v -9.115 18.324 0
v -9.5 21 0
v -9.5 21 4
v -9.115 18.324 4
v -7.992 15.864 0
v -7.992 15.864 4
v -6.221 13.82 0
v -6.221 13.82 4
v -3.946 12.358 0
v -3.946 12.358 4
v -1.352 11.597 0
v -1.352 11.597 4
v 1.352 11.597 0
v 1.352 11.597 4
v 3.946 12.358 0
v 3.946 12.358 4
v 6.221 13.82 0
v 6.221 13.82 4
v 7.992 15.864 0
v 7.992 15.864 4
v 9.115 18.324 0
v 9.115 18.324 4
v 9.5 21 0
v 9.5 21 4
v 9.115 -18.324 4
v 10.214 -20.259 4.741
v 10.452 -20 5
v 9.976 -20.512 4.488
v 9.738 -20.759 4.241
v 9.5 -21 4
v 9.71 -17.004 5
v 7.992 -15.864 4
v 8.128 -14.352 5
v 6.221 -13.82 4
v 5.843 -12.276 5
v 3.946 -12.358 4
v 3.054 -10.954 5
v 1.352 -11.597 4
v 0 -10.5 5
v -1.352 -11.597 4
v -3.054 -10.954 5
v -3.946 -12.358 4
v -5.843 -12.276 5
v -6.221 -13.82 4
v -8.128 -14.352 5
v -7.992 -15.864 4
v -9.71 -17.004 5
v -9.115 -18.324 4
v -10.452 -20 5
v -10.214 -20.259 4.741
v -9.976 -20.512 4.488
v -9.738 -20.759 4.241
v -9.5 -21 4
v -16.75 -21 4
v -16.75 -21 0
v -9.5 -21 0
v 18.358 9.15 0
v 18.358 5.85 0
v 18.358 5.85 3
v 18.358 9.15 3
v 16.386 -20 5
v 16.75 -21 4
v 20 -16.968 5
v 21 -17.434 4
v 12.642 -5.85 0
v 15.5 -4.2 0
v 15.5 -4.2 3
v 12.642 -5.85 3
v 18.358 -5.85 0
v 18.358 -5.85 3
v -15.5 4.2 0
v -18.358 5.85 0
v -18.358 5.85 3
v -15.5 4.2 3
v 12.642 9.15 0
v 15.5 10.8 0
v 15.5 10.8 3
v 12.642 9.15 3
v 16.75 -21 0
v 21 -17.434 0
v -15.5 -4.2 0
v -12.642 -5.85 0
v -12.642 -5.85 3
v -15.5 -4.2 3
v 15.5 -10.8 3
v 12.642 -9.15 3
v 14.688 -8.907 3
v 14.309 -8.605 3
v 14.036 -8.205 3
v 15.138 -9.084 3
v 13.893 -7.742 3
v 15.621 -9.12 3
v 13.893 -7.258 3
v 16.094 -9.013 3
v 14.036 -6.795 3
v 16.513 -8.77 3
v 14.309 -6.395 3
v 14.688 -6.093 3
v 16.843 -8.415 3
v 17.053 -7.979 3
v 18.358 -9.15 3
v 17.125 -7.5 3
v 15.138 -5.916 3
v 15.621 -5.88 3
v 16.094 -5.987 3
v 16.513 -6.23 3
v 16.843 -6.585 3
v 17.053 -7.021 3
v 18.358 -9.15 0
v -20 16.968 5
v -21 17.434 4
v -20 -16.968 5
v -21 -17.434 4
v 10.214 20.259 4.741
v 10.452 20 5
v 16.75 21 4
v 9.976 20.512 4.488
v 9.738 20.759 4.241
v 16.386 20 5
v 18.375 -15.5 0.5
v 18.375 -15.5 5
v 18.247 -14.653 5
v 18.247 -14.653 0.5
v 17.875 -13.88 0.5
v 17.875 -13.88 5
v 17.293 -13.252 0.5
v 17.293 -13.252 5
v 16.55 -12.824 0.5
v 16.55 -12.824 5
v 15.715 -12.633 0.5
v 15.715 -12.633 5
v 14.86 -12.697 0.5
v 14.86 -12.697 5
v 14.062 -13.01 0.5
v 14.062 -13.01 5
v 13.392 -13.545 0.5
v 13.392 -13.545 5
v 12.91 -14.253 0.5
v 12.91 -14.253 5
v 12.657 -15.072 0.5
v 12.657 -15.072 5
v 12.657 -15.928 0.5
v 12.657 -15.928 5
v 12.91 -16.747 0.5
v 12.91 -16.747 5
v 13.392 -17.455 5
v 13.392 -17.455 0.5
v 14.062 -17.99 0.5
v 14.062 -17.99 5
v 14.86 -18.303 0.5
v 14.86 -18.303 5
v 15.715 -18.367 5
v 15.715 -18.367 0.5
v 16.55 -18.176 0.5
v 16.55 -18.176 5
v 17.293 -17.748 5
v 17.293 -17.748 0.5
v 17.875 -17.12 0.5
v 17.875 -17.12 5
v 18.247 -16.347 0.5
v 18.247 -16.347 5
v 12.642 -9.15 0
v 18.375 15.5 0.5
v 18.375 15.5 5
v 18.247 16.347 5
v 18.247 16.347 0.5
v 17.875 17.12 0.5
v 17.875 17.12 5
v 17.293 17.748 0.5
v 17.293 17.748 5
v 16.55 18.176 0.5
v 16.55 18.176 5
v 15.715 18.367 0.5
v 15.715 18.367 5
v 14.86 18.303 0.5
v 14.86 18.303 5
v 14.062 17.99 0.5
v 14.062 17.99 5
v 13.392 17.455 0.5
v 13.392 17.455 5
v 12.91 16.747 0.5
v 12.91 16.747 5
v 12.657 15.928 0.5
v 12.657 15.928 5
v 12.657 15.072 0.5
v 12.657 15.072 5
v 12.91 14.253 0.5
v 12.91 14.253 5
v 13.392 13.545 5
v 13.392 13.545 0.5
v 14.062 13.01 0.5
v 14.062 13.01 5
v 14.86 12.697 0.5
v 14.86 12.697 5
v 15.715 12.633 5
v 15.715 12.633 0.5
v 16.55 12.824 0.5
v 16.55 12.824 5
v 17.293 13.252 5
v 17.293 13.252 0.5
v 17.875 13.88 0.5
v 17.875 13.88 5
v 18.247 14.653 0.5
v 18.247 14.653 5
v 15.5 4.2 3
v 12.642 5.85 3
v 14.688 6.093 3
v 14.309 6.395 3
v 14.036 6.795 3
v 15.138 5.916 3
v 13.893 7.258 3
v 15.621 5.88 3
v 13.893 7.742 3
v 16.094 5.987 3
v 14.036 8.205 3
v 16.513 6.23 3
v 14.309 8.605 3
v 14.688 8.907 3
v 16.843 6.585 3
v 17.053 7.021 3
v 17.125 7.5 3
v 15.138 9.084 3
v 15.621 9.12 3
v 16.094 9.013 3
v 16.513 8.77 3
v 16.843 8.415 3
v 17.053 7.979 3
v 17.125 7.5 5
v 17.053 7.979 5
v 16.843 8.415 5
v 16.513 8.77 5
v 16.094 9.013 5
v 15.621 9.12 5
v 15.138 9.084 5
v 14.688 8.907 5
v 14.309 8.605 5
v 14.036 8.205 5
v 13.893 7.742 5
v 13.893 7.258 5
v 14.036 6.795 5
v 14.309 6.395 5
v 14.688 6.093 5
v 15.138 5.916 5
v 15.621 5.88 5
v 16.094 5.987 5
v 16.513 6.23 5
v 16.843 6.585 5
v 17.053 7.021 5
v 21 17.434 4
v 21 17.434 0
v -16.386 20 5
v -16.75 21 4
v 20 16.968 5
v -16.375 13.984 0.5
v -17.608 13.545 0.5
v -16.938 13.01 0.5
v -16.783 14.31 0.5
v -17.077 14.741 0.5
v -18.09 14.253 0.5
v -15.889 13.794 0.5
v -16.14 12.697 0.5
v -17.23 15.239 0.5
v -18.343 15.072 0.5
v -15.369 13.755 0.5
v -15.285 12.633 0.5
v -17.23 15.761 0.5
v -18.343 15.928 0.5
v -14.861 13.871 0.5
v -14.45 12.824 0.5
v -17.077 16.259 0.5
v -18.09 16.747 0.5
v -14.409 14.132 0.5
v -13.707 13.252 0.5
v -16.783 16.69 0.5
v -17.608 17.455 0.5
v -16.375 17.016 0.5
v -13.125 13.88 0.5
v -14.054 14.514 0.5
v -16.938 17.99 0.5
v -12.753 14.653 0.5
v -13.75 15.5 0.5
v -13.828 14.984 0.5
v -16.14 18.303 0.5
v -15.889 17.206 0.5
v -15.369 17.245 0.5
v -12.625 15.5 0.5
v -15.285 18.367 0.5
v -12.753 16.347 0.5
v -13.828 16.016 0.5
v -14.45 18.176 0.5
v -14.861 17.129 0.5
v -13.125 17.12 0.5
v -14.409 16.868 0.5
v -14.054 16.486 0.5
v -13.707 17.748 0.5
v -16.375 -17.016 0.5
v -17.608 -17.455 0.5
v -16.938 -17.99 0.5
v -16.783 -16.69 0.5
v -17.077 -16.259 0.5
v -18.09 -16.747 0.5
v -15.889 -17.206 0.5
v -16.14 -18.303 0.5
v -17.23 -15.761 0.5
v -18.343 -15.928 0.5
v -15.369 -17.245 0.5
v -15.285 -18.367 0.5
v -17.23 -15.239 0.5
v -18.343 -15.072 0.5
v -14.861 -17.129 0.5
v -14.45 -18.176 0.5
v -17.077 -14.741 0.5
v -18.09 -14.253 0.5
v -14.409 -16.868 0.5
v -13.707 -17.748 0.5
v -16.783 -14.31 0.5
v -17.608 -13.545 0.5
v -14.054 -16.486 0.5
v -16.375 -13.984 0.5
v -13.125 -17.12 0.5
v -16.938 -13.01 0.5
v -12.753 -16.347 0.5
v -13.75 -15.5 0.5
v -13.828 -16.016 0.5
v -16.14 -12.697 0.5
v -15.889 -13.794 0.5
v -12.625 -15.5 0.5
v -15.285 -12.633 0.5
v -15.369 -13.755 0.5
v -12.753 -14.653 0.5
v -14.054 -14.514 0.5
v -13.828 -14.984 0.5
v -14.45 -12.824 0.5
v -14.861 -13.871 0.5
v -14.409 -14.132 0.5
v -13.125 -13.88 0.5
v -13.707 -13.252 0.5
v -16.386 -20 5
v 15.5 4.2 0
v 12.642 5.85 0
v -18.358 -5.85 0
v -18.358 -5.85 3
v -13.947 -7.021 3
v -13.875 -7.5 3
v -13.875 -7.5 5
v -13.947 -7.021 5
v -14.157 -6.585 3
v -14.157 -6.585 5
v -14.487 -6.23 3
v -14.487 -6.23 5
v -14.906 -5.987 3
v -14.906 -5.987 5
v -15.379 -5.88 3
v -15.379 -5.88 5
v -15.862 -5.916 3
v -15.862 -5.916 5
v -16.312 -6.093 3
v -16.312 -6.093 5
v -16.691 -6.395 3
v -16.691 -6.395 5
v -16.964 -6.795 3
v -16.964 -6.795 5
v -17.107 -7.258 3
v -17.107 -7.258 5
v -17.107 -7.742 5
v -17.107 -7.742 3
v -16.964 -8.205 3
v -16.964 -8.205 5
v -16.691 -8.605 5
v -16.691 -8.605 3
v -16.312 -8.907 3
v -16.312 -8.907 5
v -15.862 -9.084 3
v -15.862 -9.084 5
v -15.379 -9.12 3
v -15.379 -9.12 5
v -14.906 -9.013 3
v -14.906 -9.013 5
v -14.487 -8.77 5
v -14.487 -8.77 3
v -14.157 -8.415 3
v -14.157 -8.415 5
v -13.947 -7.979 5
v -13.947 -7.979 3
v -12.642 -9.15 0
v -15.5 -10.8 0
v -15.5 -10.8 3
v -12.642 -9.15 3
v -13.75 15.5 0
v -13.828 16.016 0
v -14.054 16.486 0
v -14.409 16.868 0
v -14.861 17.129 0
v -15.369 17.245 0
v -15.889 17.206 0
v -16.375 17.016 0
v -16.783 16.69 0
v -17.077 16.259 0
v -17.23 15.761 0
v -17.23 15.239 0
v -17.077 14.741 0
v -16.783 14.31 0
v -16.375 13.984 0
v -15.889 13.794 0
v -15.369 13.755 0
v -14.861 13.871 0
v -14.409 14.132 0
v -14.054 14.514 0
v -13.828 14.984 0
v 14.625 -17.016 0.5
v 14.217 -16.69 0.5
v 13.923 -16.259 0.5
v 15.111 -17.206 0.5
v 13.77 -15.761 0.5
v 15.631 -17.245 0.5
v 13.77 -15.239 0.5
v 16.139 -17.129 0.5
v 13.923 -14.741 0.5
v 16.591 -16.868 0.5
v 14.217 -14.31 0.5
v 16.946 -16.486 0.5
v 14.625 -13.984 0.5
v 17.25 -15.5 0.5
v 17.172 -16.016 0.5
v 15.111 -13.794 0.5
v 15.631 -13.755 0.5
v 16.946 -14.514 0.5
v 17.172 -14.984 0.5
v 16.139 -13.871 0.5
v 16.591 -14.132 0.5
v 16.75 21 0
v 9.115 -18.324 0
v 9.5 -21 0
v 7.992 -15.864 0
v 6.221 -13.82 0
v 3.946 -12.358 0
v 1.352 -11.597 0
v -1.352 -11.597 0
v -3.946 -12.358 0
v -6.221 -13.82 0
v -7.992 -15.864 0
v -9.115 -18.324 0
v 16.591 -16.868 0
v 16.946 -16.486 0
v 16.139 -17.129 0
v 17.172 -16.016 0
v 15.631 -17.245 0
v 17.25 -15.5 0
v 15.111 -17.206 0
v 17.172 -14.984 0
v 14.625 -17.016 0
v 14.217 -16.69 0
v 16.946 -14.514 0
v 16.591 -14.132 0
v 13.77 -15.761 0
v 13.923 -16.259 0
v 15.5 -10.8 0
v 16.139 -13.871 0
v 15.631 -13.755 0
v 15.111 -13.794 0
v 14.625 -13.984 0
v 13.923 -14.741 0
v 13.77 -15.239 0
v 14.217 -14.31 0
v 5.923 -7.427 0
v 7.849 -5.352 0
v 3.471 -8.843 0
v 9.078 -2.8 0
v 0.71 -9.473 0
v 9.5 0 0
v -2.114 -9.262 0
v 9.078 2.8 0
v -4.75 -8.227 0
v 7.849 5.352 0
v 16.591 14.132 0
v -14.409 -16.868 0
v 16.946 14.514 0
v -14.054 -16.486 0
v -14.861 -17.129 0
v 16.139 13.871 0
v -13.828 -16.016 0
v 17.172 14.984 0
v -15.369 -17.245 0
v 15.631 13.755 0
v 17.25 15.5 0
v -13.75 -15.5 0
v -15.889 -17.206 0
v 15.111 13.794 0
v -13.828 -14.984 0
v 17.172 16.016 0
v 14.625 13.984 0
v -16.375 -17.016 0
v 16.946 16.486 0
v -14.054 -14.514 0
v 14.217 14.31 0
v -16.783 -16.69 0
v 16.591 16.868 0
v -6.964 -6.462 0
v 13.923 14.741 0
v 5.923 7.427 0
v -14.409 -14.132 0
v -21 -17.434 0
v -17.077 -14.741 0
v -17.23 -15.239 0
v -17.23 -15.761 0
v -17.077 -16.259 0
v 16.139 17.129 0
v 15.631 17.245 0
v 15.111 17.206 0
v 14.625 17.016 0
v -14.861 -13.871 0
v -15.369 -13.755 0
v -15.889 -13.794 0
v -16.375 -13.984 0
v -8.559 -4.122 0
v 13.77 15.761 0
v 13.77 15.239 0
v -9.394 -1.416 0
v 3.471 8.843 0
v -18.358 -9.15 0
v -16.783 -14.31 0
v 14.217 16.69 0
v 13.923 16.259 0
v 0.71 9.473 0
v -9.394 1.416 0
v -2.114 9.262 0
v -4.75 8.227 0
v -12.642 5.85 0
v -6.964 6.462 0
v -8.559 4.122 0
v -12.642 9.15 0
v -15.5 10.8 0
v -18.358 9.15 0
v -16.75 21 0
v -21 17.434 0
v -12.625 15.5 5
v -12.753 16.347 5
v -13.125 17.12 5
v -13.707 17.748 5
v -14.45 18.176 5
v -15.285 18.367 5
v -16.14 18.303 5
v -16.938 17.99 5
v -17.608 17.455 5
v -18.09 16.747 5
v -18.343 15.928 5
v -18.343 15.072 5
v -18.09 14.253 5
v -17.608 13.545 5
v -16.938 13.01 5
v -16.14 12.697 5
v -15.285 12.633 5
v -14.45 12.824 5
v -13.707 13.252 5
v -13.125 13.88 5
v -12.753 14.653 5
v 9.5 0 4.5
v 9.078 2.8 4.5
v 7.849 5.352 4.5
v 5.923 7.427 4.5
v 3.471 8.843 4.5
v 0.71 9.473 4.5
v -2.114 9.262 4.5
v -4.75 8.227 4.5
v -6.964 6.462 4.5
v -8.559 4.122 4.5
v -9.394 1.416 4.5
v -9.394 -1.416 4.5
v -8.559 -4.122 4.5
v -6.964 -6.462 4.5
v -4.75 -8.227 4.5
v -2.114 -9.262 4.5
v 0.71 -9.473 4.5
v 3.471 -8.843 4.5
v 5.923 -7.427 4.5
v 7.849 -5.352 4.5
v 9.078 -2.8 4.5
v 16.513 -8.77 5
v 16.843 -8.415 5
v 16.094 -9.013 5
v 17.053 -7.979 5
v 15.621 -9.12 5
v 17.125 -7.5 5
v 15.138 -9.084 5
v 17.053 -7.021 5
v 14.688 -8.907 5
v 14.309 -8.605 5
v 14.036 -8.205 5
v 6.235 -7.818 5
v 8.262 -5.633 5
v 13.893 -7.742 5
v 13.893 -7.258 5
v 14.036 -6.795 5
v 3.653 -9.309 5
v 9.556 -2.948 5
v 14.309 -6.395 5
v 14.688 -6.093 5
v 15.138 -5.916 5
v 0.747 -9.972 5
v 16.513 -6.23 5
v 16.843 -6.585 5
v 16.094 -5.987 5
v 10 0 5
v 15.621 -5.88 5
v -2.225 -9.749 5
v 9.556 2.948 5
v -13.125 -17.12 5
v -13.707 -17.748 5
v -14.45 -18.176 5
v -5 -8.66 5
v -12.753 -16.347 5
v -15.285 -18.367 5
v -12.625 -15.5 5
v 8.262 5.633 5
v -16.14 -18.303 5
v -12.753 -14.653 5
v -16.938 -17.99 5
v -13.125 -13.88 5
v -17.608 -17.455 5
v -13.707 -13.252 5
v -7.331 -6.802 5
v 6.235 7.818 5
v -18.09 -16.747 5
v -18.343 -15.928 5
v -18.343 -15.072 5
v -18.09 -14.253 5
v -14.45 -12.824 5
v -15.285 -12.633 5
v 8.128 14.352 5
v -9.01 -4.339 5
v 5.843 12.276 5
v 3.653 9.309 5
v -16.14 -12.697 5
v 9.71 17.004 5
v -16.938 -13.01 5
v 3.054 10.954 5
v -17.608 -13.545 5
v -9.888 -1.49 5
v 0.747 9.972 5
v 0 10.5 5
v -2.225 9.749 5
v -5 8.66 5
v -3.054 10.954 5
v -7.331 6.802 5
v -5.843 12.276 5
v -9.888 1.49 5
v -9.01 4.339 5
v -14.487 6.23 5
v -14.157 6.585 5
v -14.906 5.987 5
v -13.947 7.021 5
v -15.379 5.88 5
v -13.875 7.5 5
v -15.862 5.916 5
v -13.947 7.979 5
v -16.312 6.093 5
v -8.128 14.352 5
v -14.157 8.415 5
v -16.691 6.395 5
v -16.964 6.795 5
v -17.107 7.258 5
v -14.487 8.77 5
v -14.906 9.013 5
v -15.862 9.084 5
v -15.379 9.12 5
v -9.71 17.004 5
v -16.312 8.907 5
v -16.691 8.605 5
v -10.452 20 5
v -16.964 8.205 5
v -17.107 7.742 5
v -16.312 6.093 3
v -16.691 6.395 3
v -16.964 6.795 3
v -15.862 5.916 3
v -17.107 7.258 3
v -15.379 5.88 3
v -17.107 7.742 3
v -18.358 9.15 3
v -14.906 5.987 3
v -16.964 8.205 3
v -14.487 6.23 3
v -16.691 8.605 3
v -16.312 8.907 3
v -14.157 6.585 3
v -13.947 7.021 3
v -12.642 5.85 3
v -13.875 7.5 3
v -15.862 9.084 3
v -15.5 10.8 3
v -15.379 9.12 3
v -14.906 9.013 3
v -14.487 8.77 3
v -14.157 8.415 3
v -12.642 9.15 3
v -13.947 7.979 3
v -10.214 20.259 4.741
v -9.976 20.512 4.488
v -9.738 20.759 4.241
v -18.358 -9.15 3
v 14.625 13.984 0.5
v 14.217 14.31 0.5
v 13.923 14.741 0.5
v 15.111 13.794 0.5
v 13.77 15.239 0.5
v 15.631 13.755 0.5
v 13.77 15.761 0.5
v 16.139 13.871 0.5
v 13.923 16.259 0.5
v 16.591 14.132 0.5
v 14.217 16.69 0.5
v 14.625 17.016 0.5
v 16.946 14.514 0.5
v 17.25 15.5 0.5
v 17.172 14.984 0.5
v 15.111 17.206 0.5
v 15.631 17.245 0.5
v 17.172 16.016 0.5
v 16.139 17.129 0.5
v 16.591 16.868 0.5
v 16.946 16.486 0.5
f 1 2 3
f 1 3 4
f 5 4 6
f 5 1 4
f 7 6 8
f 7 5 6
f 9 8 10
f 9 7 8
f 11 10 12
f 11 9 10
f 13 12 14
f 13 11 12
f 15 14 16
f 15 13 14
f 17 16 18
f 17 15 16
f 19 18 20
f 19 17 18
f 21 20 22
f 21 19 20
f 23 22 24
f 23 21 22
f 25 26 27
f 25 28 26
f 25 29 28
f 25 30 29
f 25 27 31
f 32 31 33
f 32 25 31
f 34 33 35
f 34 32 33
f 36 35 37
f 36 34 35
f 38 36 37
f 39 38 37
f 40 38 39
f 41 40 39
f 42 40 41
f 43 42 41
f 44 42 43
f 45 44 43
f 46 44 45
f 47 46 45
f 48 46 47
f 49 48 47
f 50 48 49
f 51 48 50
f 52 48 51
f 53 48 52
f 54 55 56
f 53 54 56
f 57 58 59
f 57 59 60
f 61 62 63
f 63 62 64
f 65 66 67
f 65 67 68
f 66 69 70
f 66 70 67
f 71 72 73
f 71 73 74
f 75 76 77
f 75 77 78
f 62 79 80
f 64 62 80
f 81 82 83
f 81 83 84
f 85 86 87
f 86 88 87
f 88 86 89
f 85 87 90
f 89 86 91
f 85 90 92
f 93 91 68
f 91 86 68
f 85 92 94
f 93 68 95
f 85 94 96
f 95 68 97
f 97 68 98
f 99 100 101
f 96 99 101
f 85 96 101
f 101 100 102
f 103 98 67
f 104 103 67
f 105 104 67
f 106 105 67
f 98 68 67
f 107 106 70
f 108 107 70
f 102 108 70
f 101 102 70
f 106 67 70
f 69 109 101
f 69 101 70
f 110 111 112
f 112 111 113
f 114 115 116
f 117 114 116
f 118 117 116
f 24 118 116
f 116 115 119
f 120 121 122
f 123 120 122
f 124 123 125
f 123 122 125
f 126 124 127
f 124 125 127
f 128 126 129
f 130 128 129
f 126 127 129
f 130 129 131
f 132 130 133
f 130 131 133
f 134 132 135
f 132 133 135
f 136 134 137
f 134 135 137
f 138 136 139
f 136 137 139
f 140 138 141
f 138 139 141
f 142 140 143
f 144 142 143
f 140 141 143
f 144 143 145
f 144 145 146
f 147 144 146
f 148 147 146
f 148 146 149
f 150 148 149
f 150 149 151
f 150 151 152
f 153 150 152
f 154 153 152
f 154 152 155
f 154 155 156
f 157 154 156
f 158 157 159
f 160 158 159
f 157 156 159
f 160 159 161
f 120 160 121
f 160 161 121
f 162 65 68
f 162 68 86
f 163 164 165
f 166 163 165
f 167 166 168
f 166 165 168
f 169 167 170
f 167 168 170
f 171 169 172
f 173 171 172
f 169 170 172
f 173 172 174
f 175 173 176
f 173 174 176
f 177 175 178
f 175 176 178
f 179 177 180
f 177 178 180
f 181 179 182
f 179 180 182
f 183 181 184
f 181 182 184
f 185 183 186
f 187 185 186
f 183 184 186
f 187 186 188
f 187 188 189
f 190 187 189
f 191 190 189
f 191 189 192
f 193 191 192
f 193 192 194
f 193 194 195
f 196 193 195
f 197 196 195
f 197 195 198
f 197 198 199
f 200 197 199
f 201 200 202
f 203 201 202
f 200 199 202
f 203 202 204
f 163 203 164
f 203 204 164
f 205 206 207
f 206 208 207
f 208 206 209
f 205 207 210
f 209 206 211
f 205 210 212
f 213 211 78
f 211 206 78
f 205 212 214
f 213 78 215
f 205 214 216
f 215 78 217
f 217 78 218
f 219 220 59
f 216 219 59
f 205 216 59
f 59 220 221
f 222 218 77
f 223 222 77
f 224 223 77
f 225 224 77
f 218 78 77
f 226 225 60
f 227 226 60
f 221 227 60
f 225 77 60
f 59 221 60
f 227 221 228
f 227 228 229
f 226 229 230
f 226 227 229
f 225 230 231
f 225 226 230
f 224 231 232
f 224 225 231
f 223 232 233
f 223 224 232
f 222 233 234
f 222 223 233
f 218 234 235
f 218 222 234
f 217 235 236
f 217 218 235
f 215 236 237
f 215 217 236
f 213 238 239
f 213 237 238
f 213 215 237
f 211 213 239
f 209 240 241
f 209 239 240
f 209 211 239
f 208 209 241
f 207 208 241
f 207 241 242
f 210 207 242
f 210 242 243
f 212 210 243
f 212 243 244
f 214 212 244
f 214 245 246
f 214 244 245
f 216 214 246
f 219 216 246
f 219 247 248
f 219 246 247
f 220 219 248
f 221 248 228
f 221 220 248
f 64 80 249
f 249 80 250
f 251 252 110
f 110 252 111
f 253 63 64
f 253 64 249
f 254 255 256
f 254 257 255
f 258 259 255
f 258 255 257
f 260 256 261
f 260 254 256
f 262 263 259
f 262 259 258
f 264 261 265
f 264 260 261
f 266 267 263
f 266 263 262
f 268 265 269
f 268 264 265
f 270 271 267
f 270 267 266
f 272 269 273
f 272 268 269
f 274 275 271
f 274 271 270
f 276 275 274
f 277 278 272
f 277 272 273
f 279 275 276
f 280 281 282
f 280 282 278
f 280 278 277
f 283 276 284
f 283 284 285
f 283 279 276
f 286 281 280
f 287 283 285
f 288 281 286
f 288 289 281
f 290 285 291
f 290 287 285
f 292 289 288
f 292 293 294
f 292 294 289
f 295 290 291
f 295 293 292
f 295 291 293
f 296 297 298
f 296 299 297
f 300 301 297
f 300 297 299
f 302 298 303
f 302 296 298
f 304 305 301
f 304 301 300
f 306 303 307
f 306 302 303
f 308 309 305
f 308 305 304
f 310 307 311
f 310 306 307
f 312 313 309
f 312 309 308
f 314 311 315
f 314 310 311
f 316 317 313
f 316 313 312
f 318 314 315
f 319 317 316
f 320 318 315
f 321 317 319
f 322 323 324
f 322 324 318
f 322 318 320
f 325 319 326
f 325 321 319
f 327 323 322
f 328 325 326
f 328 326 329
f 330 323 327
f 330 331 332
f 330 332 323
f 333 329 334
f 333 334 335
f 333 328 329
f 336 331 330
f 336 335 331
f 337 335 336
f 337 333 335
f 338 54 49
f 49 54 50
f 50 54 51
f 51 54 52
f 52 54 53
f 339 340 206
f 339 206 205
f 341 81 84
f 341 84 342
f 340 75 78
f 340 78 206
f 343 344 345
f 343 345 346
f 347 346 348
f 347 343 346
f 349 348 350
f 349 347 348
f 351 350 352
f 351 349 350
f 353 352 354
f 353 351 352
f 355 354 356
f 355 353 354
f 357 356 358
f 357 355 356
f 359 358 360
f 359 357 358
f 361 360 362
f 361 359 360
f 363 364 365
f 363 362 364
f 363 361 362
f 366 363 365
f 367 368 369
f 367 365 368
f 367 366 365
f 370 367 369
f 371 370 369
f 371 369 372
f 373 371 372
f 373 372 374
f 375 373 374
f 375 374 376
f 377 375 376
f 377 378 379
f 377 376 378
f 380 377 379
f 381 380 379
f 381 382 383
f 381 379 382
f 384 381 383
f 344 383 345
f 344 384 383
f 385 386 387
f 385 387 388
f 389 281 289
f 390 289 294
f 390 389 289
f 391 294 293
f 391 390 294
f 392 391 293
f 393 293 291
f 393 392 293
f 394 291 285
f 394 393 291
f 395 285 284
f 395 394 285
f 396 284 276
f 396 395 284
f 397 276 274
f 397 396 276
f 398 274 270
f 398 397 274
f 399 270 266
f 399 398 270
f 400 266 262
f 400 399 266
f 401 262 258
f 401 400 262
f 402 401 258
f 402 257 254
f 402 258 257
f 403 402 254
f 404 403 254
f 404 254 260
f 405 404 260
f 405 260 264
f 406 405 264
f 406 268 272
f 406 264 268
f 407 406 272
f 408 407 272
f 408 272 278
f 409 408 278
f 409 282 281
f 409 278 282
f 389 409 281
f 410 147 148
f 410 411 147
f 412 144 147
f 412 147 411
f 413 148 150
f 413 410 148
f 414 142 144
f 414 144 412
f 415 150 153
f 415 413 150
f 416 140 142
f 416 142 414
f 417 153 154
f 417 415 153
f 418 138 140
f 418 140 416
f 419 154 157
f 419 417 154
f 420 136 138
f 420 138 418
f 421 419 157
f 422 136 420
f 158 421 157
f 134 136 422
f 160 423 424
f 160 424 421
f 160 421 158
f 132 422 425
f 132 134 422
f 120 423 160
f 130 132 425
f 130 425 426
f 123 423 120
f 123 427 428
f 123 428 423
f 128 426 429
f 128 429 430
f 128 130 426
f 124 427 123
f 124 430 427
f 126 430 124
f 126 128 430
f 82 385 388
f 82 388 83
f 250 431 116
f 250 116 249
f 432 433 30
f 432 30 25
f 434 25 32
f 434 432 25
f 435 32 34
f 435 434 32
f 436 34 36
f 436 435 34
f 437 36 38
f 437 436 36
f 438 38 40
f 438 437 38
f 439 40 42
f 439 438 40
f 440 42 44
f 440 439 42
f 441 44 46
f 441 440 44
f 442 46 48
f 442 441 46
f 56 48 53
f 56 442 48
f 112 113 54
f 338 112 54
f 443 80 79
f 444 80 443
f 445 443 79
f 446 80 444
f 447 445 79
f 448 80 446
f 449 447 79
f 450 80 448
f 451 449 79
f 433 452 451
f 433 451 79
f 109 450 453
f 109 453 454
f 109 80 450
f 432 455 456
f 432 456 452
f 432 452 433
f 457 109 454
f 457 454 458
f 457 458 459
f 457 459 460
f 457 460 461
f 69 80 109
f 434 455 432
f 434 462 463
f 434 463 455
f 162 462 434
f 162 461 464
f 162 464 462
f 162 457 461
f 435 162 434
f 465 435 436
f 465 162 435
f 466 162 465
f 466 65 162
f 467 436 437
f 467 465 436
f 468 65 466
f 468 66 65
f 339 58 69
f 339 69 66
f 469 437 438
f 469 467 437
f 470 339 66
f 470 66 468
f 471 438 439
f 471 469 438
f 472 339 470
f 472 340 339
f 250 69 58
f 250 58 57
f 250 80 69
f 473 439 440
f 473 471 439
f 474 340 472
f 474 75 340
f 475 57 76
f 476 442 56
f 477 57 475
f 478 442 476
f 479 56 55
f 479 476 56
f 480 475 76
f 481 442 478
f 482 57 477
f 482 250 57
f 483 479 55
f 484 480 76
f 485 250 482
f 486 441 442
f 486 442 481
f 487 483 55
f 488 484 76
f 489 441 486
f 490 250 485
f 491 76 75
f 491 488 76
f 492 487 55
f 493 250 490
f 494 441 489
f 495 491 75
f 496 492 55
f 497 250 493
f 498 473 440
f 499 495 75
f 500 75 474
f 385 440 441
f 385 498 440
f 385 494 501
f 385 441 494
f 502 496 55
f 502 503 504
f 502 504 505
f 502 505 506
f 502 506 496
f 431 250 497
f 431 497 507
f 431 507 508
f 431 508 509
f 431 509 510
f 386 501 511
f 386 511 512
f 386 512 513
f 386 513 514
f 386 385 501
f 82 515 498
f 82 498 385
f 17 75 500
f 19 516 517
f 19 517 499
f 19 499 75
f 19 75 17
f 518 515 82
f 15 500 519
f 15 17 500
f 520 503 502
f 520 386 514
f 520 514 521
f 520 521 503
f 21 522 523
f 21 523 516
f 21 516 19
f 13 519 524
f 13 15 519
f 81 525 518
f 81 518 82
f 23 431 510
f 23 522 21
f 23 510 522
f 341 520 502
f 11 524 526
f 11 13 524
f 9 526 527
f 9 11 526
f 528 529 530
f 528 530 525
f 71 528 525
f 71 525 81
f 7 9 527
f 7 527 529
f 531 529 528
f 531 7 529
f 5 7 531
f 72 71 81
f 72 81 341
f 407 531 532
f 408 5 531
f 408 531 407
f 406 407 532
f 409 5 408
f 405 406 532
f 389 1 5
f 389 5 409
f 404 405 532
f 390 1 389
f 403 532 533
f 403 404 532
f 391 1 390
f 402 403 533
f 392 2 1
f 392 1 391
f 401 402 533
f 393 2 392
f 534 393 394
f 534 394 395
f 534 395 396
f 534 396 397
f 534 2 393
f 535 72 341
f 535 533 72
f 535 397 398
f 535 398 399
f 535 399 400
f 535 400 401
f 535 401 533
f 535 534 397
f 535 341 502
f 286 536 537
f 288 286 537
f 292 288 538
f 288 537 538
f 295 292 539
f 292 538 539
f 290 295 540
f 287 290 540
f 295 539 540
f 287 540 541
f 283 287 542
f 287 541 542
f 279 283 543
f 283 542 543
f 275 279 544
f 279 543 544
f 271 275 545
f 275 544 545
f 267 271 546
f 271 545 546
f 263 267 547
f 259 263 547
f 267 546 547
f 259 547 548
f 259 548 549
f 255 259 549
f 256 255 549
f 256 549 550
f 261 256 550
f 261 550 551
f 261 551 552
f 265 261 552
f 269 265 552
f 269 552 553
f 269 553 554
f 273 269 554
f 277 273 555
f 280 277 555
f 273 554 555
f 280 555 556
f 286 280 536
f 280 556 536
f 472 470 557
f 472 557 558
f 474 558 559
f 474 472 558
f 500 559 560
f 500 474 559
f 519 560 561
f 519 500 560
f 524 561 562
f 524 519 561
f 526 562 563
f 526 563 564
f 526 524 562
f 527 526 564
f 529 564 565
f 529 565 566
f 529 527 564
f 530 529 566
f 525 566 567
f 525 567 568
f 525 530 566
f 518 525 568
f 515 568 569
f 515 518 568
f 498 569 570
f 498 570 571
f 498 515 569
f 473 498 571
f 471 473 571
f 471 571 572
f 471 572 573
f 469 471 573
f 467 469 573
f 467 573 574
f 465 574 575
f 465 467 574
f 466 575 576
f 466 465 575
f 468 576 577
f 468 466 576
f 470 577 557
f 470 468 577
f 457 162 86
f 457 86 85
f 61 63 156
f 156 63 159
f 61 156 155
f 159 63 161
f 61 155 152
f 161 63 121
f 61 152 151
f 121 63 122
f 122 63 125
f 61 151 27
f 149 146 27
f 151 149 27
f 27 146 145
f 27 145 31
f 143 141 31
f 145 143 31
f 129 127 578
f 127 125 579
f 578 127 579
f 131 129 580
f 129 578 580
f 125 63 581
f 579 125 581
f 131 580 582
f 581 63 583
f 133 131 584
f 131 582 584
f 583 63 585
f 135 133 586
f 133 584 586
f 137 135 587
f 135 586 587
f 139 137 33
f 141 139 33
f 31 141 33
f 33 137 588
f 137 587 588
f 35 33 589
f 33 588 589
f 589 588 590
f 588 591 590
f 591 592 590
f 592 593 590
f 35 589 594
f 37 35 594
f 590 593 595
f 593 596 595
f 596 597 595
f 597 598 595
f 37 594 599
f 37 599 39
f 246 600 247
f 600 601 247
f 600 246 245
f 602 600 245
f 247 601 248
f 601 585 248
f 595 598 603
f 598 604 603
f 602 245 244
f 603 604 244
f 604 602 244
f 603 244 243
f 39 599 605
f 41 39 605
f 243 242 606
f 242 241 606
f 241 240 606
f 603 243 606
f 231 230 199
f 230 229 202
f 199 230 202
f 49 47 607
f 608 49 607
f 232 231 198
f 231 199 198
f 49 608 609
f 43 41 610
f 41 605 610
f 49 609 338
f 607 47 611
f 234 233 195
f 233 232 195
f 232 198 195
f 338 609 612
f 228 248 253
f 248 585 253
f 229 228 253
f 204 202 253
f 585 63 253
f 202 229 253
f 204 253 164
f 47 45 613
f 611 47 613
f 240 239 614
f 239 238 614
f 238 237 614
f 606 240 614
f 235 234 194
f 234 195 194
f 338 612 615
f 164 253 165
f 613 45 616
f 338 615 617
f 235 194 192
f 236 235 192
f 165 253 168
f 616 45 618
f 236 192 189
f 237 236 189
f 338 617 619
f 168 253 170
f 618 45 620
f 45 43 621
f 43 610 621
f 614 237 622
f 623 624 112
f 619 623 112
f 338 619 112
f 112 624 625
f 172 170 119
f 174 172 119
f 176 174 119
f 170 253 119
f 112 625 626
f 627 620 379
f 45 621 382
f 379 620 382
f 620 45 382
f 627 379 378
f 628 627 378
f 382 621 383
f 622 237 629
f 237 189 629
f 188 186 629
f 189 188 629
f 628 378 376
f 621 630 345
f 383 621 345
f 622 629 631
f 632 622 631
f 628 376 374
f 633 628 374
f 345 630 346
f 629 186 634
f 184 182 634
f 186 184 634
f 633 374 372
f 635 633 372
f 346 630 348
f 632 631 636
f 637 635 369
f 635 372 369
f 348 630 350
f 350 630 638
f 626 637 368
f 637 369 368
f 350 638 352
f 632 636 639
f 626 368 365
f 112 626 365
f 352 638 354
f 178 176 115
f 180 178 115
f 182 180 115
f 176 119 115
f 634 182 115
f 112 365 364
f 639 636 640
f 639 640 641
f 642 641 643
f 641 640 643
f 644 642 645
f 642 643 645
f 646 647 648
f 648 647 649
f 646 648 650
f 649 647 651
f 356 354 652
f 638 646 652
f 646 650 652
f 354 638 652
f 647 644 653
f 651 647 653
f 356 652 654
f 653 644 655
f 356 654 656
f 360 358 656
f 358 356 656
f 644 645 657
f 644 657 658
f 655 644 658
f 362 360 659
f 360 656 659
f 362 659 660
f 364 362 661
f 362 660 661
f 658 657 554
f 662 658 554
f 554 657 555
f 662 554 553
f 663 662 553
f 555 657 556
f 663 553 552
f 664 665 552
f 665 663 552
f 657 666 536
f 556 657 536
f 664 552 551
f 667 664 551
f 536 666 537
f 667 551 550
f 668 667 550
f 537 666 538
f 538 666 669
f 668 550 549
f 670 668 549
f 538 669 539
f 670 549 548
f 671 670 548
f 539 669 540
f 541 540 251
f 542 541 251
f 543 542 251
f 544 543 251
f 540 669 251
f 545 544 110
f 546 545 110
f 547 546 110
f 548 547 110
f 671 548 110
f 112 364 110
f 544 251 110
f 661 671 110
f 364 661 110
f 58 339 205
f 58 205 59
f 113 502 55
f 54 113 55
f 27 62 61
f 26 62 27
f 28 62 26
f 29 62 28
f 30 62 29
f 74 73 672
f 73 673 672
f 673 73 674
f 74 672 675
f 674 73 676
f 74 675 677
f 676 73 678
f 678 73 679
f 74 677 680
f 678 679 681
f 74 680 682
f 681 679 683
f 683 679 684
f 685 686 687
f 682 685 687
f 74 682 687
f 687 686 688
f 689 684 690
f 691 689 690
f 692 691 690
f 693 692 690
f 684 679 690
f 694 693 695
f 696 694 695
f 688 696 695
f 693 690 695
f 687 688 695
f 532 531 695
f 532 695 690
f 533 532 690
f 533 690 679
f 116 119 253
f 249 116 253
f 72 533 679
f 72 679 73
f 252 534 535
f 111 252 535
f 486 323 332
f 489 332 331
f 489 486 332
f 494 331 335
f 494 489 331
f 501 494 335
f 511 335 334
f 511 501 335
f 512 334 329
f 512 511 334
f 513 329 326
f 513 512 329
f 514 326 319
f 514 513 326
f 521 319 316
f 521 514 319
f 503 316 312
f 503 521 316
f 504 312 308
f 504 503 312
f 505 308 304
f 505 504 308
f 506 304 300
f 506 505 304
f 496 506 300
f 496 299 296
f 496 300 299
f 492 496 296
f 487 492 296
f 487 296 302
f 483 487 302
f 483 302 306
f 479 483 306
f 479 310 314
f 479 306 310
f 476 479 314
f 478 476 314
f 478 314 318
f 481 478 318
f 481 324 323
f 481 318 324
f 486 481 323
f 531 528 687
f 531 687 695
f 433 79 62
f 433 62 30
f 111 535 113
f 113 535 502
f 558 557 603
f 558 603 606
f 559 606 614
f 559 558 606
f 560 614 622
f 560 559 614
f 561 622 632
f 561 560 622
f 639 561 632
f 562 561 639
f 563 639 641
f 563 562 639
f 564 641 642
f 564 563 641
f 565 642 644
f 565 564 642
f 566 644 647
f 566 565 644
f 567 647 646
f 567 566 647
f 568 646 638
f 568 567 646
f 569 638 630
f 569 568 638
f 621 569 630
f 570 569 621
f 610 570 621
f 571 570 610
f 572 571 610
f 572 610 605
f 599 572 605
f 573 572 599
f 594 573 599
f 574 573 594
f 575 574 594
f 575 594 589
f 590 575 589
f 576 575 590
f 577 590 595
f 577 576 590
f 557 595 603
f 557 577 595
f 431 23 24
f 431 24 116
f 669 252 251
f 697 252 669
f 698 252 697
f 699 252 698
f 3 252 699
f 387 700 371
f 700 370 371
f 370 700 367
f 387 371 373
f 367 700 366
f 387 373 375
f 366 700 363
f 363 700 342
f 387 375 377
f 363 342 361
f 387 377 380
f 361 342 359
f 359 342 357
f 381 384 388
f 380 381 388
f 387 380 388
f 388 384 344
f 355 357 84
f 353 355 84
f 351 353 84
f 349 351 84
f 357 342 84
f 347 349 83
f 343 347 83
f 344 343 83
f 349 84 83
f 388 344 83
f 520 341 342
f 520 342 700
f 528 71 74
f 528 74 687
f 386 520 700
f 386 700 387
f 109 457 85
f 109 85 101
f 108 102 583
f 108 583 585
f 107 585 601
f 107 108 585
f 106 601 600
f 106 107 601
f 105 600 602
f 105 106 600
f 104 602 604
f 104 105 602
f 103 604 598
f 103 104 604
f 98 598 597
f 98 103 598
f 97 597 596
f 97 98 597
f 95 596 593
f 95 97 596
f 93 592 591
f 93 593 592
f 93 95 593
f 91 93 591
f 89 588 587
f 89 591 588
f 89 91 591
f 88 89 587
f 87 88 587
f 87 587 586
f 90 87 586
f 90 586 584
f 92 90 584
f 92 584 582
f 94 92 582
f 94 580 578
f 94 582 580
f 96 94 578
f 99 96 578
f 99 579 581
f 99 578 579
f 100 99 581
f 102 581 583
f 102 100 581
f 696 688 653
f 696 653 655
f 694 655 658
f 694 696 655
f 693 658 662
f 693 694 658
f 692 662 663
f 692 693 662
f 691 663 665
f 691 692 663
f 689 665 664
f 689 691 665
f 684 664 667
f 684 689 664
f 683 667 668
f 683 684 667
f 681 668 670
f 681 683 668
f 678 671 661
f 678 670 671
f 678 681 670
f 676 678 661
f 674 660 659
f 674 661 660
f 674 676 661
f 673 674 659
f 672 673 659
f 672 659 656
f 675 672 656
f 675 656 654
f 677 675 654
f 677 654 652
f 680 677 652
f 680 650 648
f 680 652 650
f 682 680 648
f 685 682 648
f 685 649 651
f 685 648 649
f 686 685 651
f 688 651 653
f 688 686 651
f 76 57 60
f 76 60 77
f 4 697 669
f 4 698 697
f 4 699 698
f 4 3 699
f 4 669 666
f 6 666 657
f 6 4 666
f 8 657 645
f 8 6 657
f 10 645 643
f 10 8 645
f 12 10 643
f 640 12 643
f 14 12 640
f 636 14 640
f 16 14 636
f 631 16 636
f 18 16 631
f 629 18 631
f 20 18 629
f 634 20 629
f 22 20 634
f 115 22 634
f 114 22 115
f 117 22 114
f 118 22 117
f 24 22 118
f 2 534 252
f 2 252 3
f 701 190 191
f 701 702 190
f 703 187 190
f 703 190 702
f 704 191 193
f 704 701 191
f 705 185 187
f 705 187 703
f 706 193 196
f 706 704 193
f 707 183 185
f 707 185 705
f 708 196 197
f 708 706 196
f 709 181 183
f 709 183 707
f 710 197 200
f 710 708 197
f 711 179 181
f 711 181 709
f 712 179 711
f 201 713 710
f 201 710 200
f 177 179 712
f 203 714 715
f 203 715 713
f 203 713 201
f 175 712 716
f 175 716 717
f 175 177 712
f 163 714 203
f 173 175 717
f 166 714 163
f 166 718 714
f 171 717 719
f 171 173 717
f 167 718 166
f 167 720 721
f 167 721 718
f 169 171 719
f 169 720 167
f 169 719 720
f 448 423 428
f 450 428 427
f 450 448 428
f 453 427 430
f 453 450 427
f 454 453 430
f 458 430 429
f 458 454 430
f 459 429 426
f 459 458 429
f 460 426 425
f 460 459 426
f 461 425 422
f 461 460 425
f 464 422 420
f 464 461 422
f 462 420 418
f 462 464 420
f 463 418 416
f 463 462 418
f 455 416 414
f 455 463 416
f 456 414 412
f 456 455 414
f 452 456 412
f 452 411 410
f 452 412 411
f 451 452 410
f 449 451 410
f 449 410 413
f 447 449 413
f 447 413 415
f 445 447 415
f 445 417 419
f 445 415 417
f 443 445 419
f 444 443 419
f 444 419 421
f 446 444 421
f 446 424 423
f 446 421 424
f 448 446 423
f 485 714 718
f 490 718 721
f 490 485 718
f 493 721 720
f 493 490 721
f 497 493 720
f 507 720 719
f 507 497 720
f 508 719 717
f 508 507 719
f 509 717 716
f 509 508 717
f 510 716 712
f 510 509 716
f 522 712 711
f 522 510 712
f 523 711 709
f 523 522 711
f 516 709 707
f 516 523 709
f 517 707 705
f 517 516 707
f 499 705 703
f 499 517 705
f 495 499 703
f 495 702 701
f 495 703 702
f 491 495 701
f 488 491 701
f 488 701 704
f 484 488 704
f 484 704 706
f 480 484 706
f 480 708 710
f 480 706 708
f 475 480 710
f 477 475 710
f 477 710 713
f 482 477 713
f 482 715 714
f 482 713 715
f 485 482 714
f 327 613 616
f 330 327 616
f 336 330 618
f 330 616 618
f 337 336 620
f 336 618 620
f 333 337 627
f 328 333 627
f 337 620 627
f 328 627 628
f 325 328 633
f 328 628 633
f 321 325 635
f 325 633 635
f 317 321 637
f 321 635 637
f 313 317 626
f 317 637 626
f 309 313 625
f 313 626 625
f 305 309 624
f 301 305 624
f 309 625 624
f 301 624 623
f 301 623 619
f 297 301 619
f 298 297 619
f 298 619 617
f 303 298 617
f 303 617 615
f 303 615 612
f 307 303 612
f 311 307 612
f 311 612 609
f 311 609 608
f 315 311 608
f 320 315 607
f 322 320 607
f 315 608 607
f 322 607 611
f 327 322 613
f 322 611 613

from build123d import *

# Parameters (mm, degrees)
SKETCH_R        = 9.5
SKETCH_R_2      = 1.75
PAD_DEPTH       = 5
POCKET_DEPTH    = 3
SKETCH002_R     = 1.625
POCKET001_DEPTH = 5.001
SKETCH003_R     = 2.875
POCKET002_DEPTH = 4.5
CHAMFER_SIZE    = 1
CHAMFER002_SIZE = 0.5


with BuildPart() as part:
    # Sketch → Pad (new body)
    with BuildSketch(Plane.XY):
        with BuildLine():
            Line((16.75, 21), (21, 17.433827))
            Line((21, 17.433827), (21, 0))
            Line((21, -17.433827), (21, 0))
            Line((16.75, -21), (21, -17.433827))
            Line((16.75, -21), (9.5, -21))
            ThreePointArc((9.5, -21), (0, -11.5), (-9.5, -21))
            Line((-16.75, -21), (-9.5, -21))
            Line((-21, -17.433827), (-16.75, -21))
            Line((-21, 0), (-21, -17.433827))
            Line((-21, 17.433827), (-21, 0))
            Line((-16.75, 21), (-21, 17.433827))
            Line((-16.75, 21), (-9.5, 21))
            ThreePointArc((-9.5, 21), (0, 11.5), (9.5, 21))
            Line((9.5, 21), (16.75, 21))
        make_face()
        Circle(SKETCH_R, mode=Mode.SUBTRACT)
        with Locations((-15.5, 15.5)):
            Circle(SKETCH_R_2, mode=Mode.SUBTRACT)
        with Locations((15.5, 15.5)):
            Circle(SKETCH_R_2, mode=Mode.SUBTRACT)
        with Locations((-15.5, -15.5)):
            Circle(SKETCH_R_2, mode=Mode.SUBTRACT)
        with Locations((15.5, -15.5)):
            Circle(SKETCH_R_2, mode=Mode.SUBTRACT)
    extrude(amount=PAD_DEPTH)

    # Sketch001 → Pocket (cut)
    with BuildSketch(Plane.XY):
        Polygon((-15.5, 4.2), (-12.642116, 5.85), (-12.642116, 9.15), (-15.5, 10.8), (-18.357884, 9.15), (-18.357884, 5.85), align=None)
        Polygon((-12.642116, -9.15), (-12.642116, -5.85), (-15.5, -4.2), (-18.357884, -5.85), (-18.357884, -9.15), (-15.5, -10.8), align=None)
        Polygon((18.357884, 5.85), (18.357884, 9.15), (15.5, 10.8), (12.642116, 9.15), (12.642116, 5.85), (15.5, 4.2), align=None)
        Polygon((18.357884, -9.15), (18.357884, -5.85), (15.5, -4.2), (12.642116, -5.85), (12.642116, -9.15), (15.5, -10.8), align=None)
    extrude(amount=POCKET_DEPTH, mode=Mode.SUBTRACT)

    # Sketch002 → Pocket001 (cut, through all)
    with BuildSketch(Plane.XY):
        with Locations((-15.5, 7.5)):
            Circle(SKETCH002_R)
        with Locations((15.5, 7.5)):
            Circle(SKETCH002_R)
        with Locations((15.5, -7.5)):
            Circle(SKETCH002_R)
        with Locations((-15.5, -7.5)):
            Circle(SKETCH002_R)
    extrude(amount=POCKET001_DEPTH, mode=Mode.SUBTRACT)

    # Sketch003 → Pocket002 (cut)
    with BuildSketch(Plane.XY.offset(5)):
        with Locations((-15.5, 15.5)):
            Circle(SKETCH003_R)
        with Locations((15.5, 15.5)):
            Circle(SKETCH003_R)
        with Locations((-15.5, -15.5)):
            Circle(SKETCH003_R)
        with Locations((15.5, -15.5)):
            Circle(SKETCH003_R)
    extrude(amount=-POCKET002_DEPTH, mode=Mode.SUBTRACT)

    # Chamfer
    chamfer_edges = [part.edges().sort_by_distance(p)[0] for p in [
        (-13.125, -21, 5),
        (-18.875, -19.216913, 5),
        (-21, -8.716913, 5),
        (-21, 8.716913, 5),
        (-18.875, 19.216913, 5),
        (-13.125, 21, 5),
        (0, 11.5, 5),
        (13.125, 21, 5),
        (18.875, 19.216913, 5),
        (21, 8.716913, 5),
        (21, -8.716913, 5),
        (0, -11.5, 5),
        (13.125, -21, 5),
        (18.875, -19.216913, 5),
    ]]
    chamfer(chamfer_edges, length=CHAMFER_SIZE)

    # Chamfer002
    chamfer002_edges = [part.edges().sort_by_distance(p)[0] for p in [
        (-9.5, 0, 5),
    ]]
    chamfer(chamfer002_edges, length=CHAMFER002_SIZE)


solid = part.part
